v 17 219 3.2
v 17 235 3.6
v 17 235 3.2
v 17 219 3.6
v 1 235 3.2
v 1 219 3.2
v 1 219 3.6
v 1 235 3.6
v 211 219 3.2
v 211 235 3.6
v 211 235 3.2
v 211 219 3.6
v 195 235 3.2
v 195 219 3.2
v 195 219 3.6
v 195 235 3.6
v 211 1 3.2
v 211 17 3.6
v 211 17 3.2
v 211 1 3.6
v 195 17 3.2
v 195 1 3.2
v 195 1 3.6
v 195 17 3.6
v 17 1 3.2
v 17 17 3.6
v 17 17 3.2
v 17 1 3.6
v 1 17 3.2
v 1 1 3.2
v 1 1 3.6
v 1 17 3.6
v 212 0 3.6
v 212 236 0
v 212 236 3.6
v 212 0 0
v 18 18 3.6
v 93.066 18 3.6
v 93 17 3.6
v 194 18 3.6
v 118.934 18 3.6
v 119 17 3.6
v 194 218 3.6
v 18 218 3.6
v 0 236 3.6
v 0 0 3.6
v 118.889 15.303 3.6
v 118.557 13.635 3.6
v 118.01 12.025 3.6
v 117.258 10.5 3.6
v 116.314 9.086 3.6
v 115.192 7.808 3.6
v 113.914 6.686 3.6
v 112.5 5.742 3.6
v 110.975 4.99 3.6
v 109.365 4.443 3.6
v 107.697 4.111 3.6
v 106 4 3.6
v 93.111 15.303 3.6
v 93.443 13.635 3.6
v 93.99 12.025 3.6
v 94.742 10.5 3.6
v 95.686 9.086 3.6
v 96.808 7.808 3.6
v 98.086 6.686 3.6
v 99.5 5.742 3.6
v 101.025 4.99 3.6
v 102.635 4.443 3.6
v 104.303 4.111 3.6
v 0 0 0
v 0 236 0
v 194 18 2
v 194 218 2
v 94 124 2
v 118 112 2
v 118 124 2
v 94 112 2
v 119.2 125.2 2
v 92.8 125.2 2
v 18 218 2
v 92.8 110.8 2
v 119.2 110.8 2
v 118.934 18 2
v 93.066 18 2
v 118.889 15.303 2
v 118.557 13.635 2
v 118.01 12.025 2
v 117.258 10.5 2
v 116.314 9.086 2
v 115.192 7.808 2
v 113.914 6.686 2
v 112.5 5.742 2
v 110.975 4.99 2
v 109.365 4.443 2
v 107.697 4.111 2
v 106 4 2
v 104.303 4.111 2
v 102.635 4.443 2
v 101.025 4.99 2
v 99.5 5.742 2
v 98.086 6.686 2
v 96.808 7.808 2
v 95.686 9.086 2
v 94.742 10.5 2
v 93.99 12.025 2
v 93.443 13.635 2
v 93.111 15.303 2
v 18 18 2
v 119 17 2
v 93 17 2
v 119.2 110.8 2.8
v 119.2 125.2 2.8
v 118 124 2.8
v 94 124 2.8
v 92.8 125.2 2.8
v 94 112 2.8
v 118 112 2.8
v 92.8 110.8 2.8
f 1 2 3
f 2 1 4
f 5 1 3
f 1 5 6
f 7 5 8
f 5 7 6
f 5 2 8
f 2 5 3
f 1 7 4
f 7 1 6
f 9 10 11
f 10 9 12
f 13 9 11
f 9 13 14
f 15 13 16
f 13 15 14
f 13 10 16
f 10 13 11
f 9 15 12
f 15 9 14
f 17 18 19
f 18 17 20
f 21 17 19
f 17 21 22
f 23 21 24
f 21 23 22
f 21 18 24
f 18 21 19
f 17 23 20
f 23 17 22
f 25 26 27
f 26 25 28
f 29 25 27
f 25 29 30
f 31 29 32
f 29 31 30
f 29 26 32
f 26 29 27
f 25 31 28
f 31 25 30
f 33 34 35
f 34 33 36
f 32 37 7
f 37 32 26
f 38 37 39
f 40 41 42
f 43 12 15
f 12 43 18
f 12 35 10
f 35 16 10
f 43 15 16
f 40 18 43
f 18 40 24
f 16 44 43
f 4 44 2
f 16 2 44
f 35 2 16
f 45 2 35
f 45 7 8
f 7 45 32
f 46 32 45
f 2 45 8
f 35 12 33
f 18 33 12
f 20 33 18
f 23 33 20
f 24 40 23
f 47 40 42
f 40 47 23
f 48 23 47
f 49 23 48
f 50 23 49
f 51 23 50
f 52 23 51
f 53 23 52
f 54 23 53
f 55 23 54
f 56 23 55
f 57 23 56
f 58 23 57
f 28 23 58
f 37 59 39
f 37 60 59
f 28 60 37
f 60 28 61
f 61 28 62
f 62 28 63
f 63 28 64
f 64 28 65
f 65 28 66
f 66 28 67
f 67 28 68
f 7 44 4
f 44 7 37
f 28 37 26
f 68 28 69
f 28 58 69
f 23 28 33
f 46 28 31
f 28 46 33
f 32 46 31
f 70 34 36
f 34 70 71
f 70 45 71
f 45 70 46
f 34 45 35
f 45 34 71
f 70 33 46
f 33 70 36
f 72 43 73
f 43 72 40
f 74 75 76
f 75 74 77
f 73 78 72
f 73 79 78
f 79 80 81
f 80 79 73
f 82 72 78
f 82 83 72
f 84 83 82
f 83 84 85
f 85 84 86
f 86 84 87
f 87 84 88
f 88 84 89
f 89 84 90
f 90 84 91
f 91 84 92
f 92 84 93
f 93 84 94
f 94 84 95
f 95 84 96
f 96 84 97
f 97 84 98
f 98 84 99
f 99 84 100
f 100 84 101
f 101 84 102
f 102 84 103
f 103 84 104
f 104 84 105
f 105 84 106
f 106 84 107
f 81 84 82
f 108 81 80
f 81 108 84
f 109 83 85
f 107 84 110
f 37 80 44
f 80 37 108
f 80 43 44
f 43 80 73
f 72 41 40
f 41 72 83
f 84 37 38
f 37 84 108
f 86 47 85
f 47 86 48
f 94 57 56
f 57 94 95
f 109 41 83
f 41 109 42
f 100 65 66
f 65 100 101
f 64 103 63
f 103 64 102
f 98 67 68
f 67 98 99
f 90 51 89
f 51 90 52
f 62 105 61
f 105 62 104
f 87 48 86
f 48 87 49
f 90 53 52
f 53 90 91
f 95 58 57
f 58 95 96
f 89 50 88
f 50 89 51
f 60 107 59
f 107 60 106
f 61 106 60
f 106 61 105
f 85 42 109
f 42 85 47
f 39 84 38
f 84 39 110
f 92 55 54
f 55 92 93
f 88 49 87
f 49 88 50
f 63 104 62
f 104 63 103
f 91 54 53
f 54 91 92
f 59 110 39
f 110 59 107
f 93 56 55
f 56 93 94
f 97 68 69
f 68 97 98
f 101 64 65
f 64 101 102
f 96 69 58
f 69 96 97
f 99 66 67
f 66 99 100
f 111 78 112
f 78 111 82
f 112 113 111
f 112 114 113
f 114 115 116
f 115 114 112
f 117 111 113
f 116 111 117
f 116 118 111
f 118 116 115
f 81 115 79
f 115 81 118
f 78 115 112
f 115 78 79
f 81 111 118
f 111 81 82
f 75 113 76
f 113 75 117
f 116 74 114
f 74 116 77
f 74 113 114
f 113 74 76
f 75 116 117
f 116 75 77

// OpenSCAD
// Orchard Sentinel: slide-in liner tray (the Sticky Pi "drawer" idea).
// Every fresh liner lands in exactly the same place under the camera.
// ArUco markers (hardware/print/tray_markers.png, 15 mm) sit in recessed pockets at
// the corners, OUTSIDE the liner, so alignment survives liner swaps.
// A small raised seat in the middle holds the lure in the spot the software masks out.
// Not yet test-printed. Large trays can be printed in two halves (split = true).

liner_w = 174;   // mm, Alpha Scents insert card across the trap (hardware/TRAP.md)
liner_l = 198;   // mm, along the trap
floor_w = 195;   // mm, trap floor the tray must fit on
floor_l = 227;   // mm, floor between the folded-up end flaps
clear   = 1.0;   // slack around the liner
rim     = 18;    // border that carries the markers
base_t  = 2.0;
lip_h   = 1.6;   // how far the rim stands above the liner bed
marker  = 15;    // ArUco size, mm
lure_w  = 24; lure_l = 12;   // lure seat footprint (matches the dashboard's default mask)
split   = false;

W = liner_w + 2 * (clear + rim);
L = liner_l + 2 * (clear + rim);

module tray() {
    difference() {
        cube([W, L, base_t + lip_h]);
        // liner bed
        translate([rim, rim, base_t]) cube([liner_w + 2 * clear, liner_l + 2 * clear, lip_h + 1]);
        // finger notch to lift the liner out
        translate([W / 2, rim - 1, base_t]) cylinder(d = 26, h = lip_h + 1, $fn = 48);
        // marker pockets, 0.4 mm deep, centred in the rim at each corner
        for (p = [[rim / 2, L - rim / 2], [W - rim / 2, L - rim / 2], [W - rim / 2, rim / 2], [rim / 2, rim / 2]])
            translate([p[0] - (marker + 1) / 2, p[1] - (marker + 1) / 2, base_t + lip_h - 0.4]) cube([marker + 1, marker + 1, 1]);
    }
    // lure seat: a low frame in the centre of the bed (the liner has a slit or the lure sits on top)
    translate([W / 2 - lure_w / 2 - 1.2, L / 2 - lure_l / 2 - 1.2, base_t])
        difference() {
            cube([lure_w + 2.4, lure_l + 2.4, 0.8]);
            translate([1.2, 1.2, -0.1]) cube([lure_w, lure_l, 1]);
        }
}

if (split) {
    intersection() { tray(); cube([W, L / 2, 10]); }
    translate([0, 10, 0]) intersection() { tray(); translate([0, L / 2, 0]) cube([W, L / 2, 10]); }
} else {
    tray();
}

if (W > floor_w || L > floor_l)
    echo(str("WARNING: tray ", W, " x ", L, " mm does not fit the ", floor_w, " x ", floor_l, " mm floor; shrink rim/marker."));
echo(str("Tray ", W, " x ", L, " mm. Mask for the dashboard (fractions of the image) is set per trap on the server."));
